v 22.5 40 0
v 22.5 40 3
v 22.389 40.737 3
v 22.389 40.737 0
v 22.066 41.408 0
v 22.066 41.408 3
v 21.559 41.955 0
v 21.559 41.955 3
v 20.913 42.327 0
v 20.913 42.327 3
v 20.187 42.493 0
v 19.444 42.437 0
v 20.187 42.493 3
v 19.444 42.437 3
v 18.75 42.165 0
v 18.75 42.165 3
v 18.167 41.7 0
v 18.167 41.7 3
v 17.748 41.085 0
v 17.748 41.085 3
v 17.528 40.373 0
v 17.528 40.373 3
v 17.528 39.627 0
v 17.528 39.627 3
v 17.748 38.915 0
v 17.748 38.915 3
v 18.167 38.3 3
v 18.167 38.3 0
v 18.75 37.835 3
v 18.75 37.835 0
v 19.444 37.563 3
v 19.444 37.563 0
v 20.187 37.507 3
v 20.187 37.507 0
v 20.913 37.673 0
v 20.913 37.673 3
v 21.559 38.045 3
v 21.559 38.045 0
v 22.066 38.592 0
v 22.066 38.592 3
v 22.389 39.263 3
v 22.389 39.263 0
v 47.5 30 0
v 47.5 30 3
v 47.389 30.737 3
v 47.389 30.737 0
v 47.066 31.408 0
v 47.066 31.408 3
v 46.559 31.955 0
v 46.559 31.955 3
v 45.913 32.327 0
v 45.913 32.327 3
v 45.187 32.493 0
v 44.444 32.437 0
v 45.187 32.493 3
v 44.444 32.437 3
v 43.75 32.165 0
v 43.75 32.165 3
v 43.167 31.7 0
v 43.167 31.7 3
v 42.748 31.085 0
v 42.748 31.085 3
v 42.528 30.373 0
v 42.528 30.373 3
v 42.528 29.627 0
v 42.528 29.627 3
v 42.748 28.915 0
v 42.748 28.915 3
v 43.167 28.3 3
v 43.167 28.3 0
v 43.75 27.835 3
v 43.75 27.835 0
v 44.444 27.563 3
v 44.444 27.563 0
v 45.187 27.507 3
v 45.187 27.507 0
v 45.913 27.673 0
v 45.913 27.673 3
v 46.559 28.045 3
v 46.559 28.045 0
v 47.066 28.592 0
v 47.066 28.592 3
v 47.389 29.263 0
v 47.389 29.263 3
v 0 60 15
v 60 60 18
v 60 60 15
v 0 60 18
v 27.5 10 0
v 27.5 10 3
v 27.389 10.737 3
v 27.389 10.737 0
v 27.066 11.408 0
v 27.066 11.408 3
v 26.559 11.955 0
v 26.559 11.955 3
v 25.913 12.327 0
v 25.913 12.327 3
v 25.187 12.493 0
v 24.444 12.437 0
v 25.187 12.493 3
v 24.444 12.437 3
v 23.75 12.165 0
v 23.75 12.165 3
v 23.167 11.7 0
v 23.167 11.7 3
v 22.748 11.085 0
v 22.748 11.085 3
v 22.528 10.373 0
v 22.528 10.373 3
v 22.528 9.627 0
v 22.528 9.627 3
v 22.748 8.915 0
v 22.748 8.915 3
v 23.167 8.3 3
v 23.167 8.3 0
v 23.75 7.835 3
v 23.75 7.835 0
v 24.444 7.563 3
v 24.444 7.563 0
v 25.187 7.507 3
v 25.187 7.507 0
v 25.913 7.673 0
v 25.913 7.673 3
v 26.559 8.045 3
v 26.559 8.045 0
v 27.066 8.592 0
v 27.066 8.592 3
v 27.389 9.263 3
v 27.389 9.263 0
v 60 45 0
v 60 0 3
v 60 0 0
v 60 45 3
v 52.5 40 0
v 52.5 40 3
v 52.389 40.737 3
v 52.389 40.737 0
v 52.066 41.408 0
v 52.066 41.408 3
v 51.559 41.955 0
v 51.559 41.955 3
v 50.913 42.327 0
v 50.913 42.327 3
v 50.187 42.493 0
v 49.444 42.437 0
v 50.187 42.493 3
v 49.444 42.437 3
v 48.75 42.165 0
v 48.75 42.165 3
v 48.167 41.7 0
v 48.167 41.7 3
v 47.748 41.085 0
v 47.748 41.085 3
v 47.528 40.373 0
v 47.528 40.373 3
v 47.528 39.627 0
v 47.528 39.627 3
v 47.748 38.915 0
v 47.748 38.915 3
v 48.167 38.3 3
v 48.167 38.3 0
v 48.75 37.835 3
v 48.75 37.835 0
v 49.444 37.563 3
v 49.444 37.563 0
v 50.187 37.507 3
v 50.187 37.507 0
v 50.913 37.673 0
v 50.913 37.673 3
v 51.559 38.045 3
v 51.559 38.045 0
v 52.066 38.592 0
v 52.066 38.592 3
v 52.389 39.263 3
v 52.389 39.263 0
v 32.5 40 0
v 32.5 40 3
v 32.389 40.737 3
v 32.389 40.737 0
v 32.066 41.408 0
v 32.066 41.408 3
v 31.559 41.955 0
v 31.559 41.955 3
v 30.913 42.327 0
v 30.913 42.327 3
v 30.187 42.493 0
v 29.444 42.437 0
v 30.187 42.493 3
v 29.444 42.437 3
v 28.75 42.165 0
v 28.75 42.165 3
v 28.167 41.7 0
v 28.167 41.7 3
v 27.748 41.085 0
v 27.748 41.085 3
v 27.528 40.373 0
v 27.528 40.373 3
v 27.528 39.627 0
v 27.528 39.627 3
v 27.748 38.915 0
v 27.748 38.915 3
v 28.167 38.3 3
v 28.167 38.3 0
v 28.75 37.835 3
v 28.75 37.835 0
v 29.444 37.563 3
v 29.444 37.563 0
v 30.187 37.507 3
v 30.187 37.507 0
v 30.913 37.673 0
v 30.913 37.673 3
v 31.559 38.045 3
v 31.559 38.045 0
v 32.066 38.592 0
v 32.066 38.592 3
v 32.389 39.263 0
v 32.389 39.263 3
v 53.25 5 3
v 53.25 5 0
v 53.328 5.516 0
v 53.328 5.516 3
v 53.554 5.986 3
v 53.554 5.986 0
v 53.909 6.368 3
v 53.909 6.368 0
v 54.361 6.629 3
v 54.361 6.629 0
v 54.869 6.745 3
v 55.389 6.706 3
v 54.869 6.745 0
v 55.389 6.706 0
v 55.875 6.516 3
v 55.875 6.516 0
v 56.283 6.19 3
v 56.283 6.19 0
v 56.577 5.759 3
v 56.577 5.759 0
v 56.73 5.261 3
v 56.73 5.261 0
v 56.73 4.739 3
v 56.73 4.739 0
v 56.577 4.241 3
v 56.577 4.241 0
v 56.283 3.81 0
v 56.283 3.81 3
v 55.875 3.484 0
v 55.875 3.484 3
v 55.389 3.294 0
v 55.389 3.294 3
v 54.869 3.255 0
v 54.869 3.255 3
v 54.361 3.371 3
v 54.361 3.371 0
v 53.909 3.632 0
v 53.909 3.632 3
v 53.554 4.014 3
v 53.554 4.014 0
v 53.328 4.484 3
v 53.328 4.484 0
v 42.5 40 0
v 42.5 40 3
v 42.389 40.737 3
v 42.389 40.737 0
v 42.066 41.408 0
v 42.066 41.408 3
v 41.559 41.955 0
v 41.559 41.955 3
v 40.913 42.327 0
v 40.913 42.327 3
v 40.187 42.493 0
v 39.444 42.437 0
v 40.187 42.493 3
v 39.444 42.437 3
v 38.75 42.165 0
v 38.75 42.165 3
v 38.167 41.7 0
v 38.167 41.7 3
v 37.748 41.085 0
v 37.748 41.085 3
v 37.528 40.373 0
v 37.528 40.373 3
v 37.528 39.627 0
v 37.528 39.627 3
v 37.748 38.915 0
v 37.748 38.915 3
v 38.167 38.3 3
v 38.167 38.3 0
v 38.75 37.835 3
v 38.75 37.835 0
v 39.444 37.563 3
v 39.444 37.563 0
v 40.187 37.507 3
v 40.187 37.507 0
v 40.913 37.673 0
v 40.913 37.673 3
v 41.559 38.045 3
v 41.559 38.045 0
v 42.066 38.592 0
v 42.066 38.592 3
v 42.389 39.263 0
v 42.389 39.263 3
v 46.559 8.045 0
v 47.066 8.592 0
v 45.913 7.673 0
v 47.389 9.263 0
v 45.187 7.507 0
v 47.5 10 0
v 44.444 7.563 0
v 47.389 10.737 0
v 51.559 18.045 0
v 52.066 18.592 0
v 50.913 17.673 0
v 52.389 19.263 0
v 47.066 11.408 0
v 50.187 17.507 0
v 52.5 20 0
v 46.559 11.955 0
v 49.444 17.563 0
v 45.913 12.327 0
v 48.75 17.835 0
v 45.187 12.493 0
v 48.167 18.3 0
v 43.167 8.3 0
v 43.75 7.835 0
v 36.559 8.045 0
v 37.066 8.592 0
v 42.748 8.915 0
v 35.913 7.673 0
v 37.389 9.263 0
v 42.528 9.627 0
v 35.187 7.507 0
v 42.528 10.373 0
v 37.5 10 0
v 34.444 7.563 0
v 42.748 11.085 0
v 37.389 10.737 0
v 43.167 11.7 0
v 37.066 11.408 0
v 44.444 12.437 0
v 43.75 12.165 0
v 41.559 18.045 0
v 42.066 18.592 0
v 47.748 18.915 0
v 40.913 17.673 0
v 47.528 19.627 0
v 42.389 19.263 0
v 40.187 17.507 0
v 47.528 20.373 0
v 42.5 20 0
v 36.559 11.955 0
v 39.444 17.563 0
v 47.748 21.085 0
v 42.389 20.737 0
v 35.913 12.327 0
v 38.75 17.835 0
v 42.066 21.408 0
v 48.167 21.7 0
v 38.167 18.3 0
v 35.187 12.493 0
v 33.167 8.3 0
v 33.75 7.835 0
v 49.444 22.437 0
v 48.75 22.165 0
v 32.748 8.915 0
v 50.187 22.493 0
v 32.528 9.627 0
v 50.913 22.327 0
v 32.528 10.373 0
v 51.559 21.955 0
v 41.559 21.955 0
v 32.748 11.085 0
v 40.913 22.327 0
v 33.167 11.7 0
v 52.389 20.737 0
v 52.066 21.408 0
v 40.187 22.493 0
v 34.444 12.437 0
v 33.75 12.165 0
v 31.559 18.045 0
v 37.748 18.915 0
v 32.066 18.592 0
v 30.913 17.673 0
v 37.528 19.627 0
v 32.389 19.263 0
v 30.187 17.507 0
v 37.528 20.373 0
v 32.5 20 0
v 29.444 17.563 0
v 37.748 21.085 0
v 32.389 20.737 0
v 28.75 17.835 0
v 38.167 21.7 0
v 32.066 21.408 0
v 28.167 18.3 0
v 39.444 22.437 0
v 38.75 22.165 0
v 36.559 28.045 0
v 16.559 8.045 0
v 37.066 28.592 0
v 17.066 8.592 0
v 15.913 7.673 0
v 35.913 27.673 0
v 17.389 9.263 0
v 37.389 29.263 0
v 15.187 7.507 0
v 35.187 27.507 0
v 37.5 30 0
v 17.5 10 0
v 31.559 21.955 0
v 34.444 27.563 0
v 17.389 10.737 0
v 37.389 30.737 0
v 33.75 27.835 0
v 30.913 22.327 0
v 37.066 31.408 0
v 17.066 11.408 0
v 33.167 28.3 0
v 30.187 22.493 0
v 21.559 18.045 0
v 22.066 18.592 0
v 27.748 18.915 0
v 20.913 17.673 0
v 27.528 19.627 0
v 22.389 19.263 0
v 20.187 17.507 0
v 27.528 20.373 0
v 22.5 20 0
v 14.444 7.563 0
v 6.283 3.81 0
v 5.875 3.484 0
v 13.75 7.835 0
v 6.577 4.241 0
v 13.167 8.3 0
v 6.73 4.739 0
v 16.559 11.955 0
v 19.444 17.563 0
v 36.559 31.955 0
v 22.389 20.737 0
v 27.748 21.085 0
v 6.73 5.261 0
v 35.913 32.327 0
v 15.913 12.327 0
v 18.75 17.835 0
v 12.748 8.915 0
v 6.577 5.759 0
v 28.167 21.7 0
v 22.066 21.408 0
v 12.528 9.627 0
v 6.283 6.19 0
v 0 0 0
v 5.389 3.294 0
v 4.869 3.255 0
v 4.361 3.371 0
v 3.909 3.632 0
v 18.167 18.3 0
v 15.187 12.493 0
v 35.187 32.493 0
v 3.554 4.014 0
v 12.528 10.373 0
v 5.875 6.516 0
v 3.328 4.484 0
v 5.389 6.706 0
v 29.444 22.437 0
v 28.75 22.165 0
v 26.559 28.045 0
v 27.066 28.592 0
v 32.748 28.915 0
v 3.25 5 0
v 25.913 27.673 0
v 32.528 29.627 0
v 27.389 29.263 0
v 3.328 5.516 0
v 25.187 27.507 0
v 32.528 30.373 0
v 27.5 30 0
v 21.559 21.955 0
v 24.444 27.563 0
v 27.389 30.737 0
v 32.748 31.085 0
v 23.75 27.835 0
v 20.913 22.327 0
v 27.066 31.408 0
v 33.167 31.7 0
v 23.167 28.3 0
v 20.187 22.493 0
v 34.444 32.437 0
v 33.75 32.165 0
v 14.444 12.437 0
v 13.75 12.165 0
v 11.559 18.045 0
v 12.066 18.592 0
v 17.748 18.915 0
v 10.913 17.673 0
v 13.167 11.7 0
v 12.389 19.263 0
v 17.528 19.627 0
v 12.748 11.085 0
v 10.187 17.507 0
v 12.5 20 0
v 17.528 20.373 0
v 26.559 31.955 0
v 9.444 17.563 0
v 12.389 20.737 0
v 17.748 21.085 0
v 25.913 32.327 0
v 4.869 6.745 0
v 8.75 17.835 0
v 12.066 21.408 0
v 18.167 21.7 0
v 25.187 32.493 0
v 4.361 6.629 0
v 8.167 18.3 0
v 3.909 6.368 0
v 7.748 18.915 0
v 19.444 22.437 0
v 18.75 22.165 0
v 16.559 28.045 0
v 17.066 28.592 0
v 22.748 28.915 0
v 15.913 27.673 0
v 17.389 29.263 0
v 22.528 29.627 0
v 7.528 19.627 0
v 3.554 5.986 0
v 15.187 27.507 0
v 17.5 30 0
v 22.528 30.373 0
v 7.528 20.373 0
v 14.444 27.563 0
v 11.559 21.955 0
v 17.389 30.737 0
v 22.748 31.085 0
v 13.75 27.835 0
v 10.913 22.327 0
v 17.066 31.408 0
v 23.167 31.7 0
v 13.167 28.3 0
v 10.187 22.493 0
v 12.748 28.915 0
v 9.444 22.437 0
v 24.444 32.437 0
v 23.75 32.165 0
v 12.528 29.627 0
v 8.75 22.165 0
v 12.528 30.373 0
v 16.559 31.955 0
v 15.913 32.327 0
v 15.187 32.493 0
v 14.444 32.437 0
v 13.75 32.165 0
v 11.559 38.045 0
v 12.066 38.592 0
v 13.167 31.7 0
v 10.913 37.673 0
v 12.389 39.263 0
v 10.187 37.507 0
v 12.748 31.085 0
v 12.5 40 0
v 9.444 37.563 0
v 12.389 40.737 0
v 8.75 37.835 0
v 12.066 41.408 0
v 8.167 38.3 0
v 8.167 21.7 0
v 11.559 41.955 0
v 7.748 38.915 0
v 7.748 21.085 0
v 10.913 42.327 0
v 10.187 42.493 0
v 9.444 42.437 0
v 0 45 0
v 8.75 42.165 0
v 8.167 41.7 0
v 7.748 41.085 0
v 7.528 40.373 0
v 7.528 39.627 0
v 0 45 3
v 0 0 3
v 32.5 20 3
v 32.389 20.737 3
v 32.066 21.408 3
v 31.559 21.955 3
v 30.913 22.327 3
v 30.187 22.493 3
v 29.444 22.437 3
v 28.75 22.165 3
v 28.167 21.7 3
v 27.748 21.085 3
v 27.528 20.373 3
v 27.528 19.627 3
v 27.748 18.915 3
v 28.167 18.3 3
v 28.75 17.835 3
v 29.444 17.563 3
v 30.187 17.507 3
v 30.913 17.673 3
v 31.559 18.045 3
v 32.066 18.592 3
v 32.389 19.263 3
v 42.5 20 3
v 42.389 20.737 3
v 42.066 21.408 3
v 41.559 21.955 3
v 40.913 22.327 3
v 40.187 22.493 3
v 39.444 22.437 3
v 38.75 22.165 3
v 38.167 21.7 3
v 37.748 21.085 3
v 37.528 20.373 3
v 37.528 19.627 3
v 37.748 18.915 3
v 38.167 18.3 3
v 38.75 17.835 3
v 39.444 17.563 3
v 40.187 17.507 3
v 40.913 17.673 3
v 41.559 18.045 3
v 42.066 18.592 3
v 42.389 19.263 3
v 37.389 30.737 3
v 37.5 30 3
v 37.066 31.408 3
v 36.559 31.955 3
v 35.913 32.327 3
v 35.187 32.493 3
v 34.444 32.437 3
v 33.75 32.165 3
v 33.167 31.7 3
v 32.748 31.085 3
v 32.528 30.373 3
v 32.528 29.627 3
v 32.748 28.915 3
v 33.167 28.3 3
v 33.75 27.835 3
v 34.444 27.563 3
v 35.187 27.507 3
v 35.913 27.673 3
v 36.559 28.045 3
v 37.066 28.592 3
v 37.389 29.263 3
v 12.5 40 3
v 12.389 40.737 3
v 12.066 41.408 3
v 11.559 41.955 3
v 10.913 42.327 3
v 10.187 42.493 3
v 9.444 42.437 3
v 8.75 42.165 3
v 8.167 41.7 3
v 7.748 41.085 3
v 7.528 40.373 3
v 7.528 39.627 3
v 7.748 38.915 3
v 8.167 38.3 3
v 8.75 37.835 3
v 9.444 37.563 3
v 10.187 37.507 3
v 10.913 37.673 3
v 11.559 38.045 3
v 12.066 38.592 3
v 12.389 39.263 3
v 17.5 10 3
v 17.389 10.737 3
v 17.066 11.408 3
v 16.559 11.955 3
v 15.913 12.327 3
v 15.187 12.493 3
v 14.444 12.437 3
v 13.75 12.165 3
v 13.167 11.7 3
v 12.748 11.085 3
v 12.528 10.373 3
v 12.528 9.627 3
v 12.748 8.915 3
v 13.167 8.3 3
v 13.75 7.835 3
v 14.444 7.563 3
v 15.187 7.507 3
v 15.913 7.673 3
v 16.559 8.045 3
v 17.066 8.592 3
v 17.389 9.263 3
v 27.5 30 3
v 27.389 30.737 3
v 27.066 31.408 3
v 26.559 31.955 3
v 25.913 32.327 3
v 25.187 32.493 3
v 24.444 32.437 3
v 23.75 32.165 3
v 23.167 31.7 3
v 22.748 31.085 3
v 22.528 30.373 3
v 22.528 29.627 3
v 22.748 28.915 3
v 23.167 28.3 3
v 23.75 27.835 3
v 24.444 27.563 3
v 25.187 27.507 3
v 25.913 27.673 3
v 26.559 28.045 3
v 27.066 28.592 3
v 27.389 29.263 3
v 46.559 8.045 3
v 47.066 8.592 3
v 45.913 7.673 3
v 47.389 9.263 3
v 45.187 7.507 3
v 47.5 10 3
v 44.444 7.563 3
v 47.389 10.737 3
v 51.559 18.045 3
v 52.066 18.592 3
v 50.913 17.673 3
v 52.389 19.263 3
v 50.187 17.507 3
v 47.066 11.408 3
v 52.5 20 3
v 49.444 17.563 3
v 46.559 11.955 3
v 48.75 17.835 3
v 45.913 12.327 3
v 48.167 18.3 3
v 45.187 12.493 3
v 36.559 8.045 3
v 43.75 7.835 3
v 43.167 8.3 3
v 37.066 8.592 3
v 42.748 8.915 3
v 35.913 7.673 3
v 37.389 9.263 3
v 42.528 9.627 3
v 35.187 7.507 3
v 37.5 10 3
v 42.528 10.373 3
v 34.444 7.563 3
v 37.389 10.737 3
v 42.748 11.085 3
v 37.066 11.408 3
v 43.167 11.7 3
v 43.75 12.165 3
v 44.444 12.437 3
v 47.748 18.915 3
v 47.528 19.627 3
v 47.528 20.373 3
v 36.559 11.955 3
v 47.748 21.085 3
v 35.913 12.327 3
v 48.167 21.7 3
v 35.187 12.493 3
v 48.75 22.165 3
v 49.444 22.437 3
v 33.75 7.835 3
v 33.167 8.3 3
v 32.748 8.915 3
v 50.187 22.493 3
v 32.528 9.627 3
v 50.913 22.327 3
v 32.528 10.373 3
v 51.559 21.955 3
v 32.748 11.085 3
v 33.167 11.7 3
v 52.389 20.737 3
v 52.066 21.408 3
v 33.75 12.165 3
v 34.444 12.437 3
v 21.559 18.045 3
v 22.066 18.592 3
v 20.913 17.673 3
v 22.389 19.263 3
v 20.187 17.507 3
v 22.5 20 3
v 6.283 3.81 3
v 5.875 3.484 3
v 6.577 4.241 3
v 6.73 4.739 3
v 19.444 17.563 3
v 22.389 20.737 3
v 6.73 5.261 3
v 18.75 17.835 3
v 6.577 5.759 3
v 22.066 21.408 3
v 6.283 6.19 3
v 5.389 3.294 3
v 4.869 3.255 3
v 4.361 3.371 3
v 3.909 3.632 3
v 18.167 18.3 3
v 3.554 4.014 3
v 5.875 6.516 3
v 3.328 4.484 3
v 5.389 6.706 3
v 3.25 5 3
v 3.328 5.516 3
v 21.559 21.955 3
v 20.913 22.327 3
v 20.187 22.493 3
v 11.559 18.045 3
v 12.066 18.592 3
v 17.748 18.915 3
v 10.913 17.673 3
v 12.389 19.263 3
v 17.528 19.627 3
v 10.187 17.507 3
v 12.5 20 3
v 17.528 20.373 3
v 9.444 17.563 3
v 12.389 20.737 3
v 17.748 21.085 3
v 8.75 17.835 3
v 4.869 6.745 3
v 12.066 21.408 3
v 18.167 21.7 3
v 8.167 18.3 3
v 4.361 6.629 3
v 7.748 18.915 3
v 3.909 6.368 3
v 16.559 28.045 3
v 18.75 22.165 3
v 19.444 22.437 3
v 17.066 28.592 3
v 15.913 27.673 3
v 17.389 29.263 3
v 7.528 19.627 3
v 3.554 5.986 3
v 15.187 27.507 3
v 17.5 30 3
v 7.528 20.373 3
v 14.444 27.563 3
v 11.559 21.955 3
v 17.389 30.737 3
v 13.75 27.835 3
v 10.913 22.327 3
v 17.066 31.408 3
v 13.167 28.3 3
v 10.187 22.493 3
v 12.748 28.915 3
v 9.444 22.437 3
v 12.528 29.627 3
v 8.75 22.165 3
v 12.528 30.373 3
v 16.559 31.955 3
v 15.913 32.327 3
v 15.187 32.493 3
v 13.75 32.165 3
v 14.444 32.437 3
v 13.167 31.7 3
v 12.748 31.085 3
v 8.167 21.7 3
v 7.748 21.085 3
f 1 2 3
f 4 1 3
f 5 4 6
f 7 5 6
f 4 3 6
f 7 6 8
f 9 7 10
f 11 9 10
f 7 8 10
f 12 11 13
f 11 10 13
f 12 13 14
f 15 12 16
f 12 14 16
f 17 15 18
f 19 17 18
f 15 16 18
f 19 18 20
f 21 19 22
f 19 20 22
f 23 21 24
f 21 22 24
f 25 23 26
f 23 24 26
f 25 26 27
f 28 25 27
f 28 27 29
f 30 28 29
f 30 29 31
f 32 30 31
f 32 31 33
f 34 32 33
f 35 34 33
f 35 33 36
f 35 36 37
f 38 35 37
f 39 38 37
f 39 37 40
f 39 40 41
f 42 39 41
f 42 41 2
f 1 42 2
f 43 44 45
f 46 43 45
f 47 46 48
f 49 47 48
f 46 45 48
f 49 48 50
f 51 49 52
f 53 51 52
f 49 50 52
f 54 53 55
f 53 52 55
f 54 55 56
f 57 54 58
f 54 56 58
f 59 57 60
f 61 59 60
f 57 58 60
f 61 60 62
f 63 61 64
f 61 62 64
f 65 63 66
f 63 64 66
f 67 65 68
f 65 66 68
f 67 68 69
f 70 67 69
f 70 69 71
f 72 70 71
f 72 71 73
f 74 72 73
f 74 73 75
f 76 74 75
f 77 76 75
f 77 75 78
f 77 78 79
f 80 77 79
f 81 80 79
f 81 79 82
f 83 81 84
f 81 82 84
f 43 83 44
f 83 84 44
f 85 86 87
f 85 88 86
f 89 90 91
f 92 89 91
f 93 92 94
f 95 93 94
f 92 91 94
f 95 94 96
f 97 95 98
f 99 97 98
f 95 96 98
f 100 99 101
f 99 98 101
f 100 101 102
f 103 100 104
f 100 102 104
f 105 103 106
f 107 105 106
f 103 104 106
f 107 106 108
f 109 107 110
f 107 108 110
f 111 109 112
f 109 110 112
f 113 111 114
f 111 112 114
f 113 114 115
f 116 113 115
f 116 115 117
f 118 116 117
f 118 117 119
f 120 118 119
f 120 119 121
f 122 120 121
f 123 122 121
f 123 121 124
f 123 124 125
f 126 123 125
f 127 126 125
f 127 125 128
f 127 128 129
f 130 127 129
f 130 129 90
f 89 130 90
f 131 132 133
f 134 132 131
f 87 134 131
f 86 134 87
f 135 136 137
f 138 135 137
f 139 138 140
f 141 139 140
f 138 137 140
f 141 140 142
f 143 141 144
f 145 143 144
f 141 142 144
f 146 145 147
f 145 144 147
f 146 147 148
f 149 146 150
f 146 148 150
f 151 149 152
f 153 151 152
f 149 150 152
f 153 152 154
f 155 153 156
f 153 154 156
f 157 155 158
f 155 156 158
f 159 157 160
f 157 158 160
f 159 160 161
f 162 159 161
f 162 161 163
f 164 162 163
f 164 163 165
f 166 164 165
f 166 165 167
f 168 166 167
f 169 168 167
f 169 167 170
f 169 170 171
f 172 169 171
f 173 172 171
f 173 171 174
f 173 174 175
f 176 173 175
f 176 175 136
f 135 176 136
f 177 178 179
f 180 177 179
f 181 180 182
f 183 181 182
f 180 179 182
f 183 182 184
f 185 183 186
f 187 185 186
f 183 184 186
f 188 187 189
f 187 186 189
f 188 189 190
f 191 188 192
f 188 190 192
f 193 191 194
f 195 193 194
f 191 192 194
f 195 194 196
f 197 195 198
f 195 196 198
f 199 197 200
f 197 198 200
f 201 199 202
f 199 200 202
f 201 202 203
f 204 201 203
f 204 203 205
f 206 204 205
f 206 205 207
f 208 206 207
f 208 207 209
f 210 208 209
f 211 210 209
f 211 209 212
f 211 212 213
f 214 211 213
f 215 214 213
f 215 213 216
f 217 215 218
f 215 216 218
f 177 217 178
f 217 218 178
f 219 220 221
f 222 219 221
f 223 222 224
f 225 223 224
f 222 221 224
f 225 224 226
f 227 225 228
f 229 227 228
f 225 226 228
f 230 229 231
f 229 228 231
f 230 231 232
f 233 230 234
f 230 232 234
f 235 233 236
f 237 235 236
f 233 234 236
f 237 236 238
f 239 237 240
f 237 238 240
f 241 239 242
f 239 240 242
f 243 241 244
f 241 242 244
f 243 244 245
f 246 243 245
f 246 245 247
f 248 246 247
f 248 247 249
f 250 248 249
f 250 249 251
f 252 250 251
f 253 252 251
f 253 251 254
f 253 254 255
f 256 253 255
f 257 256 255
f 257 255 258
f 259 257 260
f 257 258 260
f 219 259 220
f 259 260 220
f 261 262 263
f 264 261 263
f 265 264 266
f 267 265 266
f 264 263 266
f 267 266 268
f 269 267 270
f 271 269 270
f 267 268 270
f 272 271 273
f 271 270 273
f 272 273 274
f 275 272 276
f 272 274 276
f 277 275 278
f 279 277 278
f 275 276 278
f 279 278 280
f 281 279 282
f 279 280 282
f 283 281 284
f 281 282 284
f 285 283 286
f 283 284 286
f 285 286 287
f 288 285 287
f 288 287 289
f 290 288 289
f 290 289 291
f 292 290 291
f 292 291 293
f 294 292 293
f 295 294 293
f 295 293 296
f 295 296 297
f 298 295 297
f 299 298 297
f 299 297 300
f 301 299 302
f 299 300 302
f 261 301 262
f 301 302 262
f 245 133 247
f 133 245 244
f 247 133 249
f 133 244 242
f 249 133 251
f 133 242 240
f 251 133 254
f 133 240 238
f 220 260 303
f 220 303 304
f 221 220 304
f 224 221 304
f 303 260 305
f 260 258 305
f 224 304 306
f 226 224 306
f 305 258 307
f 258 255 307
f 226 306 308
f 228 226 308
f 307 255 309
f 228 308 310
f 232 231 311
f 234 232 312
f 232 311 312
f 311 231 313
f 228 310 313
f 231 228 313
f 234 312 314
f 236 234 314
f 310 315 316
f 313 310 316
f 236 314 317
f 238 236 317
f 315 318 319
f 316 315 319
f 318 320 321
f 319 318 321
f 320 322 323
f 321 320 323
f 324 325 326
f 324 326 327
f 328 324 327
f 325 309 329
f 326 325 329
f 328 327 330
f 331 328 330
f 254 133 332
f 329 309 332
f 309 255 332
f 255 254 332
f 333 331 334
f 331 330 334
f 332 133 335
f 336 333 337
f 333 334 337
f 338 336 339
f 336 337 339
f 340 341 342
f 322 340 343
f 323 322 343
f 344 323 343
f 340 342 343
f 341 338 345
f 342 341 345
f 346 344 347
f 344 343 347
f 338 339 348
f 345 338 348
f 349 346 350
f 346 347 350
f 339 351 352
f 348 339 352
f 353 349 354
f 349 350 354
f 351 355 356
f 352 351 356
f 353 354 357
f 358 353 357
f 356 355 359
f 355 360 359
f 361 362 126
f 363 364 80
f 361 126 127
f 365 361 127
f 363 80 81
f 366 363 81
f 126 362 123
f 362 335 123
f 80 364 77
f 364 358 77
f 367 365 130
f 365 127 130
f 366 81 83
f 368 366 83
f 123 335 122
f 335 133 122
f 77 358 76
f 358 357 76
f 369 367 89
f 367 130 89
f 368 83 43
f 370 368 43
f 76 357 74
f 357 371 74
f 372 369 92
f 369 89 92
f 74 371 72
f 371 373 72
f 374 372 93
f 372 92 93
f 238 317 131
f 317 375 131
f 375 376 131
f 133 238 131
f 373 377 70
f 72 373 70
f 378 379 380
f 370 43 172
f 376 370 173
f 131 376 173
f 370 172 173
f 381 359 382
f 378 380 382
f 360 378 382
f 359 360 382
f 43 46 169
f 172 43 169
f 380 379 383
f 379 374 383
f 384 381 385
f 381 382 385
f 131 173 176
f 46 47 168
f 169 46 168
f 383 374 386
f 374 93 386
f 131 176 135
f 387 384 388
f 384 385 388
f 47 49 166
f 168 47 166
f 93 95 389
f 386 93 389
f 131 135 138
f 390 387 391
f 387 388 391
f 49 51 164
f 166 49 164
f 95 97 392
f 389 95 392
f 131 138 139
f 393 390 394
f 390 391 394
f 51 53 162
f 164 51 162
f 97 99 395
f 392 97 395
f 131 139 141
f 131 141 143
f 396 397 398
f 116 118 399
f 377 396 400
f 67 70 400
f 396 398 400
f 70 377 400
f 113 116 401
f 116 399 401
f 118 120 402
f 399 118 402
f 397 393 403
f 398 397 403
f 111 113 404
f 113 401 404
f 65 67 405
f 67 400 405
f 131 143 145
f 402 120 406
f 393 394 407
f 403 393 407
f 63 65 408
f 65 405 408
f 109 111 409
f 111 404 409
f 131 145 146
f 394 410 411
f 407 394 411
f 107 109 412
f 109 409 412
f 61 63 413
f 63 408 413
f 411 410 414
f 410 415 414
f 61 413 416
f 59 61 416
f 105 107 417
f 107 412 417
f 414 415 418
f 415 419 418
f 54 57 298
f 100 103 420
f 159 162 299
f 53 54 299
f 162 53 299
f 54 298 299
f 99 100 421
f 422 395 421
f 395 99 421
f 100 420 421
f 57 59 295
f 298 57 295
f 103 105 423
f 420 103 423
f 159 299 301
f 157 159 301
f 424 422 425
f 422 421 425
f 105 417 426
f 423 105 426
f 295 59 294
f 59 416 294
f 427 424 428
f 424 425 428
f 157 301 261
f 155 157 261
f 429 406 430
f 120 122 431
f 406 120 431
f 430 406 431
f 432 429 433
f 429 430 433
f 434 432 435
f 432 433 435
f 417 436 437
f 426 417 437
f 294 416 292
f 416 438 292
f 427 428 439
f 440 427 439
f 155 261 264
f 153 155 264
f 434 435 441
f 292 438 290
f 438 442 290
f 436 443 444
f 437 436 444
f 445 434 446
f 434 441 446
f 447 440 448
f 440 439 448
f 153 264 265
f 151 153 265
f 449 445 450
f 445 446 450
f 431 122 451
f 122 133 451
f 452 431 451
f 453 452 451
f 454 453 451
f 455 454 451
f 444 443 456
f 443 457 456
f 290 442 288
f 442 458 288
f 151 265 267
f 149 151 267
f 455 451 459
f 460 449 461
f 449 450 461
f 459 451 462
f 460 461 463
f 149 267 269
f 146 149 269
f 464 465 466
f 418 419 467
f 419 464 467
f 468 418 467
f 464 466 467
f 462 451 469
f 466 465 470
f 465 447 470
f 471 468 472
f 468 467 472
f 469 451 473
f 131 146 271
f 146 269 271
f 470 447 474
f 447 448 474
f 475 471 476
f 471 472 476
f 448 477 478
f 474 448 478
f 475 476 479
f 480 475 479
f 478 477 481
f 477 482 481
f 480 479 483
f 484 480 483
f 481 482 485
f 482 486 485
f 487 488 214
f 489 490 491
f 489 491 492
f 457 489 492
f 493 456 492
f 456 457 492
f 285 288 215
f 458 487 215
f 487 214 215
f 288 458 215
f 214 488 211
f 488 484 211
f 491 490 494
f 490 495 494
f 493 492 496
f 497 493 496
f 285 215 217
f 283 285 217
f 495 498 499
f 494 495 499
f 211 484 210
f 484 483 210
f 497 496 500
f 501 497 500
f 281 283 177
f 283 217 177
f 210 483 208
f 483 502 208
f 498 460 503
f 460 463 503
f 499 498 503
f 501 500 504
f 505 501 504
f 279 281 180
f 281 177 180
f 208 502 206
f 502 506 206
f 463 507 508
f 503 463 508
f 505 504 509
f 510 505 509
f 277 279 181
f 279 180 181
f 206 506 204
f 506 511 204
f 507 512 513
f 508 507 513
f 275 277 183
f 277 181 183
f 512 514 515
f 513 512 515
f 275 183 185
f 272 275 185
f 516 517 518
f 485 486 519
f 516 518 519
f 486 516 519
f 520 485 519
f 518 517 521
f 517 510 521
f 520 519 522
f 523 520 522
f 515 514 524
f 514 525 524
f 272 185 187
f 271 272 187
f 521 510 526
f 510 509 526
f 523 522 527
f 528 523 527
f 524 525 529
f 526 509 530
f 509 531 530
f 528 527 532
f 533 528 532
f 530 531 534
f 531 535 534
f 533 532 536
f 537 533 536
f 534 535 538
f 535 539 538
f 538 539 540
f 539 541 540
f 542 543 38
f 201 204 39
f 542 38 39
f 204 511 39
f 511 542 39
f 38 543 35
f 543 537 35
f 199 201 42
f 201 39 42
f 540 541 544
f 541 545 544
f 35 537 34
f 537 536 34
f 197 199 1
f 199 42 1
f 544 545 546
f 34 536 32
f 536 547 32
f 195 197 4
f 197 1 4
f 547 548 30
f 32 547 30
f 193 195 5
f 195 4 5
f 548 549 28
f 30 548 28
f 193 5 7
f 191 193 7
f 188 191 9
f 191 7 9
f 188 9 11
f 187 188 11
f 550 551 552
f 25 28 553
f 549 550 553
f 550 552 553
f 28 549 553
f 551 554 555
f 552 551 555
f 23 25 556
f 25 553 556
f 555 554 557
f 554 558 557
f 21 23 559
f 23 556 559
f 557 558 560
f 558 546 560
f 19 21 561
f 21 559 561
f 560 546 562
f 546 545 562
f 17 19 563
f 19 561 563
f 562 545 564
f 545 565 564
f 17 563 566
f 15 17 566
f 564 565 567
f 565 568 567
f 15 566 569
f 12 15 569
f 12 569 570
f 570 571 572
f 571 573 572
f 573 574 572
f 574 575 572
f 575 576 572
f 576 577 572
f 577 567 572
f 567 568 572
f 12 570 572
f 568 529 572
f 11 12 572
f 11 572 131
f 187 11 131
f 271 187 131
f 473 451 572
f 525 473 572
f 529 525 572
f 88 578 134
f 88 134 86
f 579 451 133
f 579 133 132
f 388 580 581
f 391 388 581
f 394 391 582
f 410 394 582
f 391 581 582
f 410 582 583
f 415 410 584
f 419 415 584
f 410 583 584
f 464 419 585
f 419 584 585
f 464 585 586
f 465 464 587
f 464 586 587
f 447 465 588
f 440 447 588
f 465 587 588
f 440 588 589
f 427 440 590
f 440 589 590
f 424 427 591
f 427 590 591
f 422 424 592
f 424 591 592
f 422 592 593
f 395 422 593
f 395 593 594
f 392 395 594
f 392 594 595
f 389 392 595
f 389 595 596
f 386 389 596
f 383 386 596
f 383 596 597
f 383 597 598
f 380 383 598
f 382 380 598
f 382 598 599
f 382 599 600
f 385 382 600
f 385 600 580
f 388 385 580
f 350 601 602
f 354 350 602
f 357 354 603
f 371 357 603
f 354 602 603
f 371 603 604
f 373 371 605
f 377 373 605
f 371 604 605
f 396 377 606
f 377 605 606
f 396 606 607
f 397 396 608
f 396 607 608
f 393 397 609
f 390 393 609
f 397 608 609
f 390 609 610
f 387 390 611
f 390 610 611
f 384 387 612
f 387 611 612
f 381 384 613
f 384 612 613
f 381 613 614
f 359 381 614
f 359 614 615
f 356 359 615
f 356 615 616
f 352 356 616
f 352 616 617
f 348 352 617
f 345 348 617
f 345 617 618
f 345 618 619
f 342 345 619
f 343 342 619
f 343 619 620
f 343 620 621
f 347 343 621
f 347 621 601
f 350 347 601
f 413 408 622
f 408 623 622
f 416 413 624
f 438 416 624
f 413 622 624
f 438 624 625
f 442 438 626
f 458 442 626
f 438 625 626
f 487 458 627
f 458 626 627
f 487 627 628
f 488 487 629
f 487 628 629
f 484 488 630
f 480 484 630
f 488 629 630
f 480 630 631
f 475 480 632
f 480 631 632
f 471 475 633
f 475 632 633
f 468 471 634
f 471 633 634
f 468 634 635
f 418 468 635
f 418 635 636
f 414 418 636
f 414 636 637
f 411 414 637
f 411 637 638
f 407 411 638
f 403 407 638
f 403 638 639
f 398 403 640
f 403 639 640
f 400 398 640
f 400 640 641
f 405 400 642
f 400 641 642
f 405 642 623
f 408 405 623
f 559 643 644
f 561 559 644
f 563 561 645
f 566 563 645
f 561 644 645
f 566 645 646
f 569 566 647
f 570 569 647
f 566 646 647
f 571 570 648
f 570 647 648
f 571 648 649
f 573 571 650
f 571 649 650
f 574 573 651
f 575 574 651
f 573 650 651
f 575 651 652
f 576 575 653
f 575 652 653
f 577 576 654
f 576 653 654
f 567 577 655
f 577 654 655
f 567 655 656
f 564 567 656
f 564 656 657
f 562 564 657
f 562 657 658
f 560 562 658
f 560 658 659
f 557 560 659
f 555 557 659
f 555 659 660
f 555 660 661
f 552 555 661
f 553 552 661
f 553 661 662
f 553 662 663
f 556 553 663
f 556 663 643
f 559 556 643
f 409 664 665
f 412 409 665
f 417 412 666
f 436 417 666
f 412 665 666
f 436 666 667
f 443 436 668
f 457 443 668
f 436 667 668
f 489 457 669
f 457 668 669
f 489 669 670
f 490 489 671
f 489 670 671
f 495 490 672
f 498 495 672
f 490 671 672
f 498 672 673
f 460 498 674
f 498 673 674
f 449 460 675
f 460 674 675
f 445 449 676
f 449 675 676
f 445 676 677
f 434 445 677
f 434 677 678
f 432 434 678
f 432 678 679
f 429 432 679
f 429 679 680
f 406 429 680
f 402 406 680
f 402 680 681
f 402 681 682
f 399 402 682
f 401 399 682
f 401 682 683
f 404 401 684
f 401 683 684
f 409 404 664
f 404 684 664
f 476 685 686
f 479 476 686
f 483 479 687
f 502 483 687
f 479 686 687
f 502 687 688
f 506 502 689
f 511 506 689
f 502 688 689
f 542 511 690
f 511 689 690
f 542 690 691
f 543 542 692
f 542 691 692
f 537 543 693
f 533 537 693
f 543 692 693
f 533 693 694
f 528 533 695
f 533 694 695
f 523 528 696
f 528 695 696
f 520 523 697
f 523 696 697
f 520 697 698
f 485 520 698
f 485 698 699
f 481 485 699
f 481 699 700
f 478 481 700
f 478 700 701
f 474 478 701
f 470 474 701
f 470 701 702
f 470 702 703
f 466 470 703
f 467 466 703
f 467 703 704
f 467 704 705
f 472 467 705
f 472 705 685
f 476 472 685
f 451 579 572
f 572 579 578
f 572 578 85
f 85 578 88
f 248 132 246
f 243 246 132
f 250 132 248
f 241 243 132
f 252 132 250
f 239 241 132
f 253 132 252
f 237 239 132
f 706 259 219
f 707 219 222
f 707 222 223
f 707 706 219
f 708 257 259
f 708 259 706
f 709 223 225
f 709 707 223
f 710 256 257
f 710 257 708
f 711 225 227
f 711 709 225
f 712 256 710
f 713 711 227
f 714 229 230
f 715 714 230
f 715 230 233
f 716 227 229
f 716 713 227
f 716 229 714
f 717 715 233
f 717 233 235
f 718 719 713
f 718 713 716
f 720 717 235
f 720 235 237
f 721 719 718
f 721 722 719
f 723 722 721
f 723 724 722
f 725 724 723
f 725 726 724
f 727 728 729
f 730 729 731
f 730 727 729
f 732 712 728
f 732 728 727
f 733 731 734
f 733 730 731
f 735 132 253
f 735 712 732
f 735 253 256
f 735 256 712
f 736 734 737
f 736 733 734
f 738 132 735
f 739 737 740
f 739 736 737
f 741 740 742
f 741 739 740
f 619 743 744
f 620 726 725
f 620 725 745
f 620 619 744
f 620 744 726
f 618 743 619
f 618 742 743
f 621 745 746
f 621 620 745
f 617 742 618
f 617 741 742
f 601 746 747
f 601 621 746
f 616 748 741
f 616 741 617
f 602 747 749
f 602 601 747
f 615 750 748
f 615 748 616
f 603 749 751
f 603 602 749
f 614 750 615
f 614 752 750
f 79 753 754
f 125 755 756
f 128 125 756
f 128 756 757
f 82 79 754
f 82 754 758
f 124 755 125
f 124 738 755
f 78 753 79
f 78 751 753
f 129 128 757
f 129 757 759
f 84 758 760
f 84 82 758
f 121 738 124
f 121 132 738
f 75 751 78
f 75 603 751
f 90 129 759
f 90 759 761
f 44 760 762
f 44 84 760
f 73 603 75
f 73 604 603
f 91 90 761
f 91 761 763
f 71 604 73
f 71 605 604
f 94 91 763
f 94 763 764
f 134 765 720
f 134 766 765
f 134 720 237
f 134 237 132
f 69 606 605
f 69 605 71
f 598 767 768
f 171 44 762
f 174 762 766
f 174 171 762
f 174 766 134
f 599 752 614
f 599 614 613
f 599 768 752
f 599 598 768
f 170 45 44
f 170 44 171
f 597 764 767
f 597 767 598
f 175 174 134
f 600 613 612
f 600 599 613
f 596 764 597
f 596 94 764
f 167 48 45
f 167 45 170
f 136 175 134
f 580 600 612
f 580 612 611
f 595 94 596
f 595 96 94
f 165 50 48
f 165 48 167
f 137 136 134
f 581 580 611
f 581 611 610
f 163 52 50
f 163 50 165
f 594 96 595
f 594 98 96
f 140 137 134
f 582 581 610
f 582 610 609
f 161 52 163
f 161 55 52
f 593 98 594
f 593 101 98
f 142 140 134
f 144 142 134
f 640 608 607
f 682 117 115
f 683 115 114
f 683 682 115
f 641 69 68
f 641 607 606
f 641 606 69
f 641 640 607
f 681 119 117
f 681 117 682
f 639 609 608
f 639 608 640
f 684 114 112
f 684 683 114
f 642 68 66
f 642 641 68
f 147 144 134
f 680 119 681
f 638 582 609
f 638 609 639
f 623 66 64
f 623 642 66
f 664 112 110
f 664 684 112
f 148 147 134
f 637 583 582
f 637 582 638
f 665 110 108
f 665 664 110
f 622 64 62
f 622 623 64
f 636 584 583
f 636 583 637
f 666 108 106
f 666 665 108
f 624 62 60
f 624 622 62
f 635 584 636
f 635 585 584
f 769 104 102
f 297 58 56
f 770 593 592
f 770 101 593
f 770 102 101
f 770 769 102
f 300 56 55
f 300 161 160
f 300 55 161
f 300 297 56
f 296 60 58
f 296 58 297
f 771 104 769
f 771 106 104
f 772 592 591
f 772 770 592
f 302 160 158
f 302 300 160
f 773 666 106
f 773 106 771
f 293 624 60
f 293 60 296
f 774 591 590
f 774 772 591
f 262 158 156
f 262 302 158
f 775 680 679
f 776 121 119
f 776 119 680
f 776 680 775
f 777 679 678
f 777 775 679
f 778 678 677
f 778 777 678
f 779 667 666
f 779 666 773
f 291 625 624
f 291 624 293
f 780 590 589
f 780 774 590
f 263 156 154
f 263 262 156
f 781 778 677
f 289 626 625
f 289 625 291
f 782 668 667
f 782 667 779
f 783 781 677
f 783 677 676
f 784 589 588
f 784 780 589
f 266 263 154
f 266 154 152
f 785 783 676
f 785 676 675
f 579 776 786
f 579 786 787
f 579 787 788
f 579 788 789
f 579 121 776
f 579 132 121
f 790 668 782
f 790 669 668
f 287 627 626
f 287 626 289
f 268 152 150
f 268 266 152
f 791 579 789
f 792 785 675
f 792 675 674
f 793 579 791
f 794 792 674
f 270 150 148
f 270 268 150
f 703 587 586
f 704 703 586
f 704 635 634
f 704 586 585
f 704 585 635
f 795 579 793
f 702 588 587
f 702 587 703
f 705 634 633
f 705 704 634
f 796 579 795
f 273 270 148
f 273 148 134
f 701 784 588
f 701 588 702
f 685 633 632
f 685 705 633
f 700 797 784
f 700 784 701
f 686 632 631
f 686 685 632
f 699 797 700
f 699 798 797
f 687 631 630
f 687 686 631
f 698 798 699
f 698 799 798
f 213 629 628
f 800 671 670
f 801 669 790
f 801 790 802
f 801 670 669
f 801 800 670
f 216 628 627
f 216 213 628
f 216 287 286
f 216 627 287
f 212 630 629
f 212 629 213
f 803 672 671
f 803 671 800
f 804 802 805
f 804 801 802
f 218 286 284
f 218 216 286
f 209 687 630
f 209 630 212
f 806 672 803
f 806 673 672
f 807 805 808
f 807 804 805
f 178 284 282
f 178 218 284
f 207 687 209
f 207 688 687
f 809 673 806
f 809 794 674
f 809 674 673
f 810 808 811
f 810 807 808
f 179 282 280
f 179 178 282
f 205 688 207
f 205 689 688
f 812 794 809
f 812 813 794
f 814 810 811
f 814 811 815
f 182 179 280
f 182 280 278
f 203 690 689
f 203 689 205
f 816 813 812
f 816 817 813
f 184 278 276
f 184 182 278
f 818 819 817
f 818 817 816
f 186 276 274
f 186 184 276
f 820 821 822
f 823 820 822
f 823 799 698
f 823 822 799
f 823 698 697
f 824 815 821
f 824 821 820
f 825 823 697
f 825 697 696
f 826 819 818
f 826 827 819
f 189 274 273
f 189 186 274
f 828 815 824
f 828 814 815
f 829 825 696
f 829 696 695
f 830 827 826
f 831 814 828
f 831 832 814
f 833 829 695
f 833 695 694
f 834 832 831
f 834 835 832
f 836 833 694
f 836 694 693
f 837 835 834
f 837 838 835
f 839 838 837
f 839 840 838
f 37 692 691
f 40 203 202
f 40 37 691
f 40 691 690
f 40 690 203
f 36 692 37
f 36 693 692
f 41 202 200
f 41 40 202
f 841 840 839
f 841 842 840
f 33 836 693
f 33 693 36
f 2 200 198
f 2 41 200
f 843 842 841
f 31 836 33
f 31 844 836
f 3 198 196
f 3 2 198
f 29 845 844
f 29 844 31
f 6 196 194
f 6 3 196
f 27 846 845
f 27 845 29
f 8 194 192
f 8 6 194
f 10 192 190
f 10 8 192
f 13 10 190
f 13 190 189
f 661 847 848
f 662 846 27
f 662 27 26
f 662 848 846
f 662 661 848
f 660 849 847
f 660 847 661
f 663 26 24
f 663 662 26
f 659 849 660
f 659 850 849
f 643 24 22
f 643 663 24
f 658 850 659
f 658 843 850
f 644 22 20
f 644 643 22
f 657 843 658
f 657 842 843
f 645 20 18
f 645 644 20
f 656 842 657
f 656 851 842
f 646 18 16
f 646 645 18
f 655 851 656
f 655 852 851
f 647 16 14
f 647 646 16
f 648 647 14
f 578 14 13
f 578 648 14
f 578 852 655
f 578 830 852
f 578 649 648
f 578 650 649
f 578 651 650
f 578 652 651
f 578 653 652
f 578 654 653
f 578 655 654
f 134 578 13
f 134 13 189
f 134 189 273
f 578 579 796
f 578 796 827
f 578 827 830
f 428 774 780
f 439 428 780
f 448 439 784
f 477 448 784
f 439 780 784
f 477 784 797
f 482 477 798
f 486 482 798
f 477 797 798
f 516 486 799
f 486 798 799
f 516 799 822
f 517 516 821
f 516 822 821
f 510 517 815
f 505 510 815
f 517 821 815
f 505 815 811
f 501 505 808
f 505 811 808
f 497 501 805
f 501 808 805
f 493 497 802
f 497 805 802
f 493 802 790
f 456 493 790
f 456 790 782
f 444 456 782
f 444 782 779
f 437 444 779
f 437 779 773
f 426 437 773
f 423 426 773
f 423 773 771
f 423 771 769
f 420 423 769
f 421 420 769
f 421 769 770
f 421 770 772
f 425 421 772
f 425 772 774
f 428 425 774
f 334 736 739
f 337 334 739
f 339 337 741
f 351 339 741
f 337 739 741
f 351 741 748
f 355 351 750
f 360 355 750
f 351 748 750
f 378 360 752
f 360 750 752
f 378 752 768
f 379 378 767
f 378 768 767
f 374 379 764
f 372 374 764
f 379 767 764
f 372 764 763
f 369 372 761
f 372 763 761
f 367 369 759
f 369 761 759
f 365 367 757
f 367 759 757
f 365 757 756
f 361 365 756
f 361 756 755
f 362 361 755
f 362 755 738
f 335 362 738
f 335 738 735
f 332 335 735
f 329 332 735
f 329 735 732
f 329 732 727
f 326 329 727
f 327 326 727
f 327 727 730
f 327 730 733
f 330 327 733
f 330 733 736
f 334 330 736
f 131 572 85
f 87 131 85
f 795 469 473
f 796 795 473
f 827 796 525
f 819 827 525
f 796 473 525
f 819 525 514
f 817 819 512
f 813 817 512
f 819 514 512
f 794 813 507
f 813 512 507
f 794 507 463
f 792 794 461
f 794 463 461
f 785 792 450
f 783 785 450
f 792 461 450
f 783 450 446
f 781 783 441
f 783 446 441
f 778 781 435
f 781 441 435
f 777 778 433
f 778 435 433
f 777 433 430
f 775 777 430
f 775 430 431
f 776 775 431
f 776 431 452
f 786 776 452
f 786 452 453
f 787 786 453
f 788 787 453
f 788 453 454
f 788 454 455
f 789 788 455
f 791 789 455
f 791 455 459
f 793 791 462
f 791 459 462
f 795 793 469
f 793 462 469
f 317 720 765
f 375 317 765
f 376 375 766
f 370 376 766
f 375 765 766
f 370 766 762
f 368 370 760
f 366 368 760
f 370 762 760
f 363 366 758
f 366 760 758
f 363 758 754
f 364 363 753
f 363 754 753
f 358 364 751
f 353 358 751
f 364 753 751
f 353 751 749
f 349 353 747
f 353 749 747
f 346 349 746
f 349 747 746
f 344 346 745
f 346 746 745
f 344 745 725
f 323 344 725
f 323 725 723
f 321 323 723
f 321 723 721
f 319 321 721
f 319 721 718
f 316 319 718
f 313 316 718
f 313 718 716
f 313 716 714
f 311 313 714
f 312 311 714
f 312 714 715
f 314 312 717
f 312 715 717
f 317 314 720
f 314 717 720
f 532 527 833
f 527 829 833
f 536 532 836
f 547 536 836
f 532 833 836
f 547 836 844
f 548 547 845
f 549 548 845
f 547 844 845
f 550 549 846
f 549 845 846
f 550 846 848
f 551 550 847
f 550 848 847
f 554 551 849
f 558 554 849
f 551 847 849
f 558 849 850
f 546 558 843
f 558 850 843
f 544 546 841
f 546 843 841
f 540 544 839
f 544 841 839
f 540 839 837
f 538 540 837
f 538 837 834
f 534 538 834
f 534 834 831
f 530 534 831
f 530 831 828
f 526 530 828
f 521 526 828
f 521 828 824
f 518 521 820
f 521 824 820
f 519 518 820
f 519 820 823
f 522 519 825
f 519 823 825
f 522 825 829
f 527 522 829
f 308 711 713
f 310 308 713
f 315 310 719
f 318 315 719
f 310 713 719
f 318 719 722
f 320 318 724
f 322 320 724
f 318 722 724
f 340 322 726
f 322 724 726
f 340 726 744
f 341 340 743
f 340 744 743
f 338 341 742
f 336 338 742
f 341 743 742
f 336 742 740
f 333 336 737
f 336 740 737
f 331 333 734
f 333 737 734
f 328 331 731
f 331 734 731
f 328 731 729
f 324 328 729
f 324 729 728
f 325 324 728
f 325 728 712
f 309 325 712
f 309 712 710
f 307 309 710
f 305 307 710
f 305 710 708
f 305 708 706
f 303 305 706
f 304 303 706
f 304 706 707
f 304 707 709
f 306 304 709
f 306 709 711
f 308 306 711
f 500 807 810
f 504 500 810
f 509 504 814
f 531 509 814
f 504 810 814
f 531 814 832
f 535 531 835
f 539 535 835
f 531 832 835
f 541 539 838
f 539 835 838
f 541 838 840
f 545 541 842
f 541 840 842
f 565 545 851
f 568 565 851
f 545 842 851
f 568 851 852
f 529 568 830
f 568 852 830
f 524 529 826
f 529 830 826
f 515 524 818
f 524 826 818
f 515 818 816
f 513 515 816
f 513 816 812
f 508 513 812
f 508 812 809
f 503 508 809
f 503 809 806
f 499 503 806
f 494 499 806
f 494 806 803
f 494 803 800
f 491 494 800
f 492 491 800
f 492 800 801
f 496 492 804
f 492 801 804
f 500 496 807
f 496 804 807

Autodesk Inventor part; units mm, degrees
ref_plane "YZ Plane" through (0, 0, 0) normal (1, 0, 0) x (0, 1, 0)
ref_plane "XZ Plane" through (0, 0, 0) normal (0, 1, 0) x (-1, 0, 0)
ref_plane "XY Plane" through (0, 0, 0) normal (0, 0, 1) x (1, 0, 0)
sketch "Sketch3" plane through (0, 0, 0) normal (1, 0, 0) x (0, 1, 0)
  line L0 (0, 0) -> (45, 0)
  line L1 (45, 0) -> (60, 15)
  line L2 (0, 0) -> (0, 3)
  line L3 (0, 3) -> (45, 3)
  line L4 (45, 3) -> (60, 18)
  line L5 (60, 18) -> (60, 15)
  dimension "d7" = 45
  dimension "d8" = 135
  dimension "d10" = 15
  dimension "d11" = 45
  dimension "d12" = 21.2132
  dimension "d13" = 3
extrude "Extrusion3" add sketch "Sketch3" along normal blind 60
sketch "Sketch4" plane through (0, 0, 0) normal (0, 0, -1) x (-1, 0, 0)
  line L0 (0, 0) -> (0, 45) projected
  line L1 (0, 45) -> (-60, 45) projected
  line L2 (-60, 0) -> (-60, 45) projected
  line L3 (0, 0) -> (-60, 0) projected
  circle A0 centre (-55, 5) radius 1.75
  circle A1 centre (-5, 5) radius 1.75
  dimension "d16" = 3.5
  dimension "d18" = 50
  dimension "d19" = 5
extrude "Extrusion4" cut sketch "Sketch4" against normal through all contours A0 | A1
sketch "Sketch5" plane through (0, 0, 3) normal (0, 0, 1) x (1, 0, 0)
  circle A0 centre (55, 5) radius 1.75 projected
  circle A1 centre (5, 5) radius 1.75 projected
  line L0 (0, 45) -> (0, 0) projected
  line L1 (0, 0) -> (60, 0) projected
  line L2 (60, 45) -> (60, 0) projected
  line L3 (0, 45) -> (60, 45) projected
  circle A2 centre (10, 40) radius 2.5
  circle A3 centre (20, 40) radius 2.5
  circle A4 centre (30, 40) radius 2.5
  circle A5 centre (40, 40) radius 2.5
  circle A6 centre (50, 40) radius 2.5
  circle A7 centre (10, 20) radius 2.5
  circle A8 centre (20, 20) radius 2.5
  circle A9 centre (30, 20) radius 2.5
  circle A10 centre (40, 20) radius 2.5
  circle A11 centre (50, 20) radius 2.5
  circle A12 centre (15, 30) radius 2.5
  circle A13 centre (25, 30) radius 2.5
  circle A14 centre (35, 30) radius 2.5
  circle A15 centre (45, 30) radius 2.5
  circle A16 centre (15, 10) radius 2.5
  circle A17 centre (25, 10) radius 2.5
  circle A18 centre (35, 10) radius 2.5
  circle A19 centre (45, 10) radius 2.5
  point P0 (0, 0)
  dimension "d22" = 5
  dimension "d25" = 10
  dimension "d28" = 20
  dimension "d32" = 5
  dimension "d33" = 10
  dimension "d35" = 10
  dimension "d38" = 10
  dimension "d41" = 20
extrude "Extrusion5" cut sketch "Sketch5" against normal through all contours A2 | A3 | A4 | A5 | A6 | A7 | A8 | A9 | A10 | A11 | A12 | A13 | A14 | A15 | A16 | A17 | A18 | A19
properties part number "rejilla.ventilador"
